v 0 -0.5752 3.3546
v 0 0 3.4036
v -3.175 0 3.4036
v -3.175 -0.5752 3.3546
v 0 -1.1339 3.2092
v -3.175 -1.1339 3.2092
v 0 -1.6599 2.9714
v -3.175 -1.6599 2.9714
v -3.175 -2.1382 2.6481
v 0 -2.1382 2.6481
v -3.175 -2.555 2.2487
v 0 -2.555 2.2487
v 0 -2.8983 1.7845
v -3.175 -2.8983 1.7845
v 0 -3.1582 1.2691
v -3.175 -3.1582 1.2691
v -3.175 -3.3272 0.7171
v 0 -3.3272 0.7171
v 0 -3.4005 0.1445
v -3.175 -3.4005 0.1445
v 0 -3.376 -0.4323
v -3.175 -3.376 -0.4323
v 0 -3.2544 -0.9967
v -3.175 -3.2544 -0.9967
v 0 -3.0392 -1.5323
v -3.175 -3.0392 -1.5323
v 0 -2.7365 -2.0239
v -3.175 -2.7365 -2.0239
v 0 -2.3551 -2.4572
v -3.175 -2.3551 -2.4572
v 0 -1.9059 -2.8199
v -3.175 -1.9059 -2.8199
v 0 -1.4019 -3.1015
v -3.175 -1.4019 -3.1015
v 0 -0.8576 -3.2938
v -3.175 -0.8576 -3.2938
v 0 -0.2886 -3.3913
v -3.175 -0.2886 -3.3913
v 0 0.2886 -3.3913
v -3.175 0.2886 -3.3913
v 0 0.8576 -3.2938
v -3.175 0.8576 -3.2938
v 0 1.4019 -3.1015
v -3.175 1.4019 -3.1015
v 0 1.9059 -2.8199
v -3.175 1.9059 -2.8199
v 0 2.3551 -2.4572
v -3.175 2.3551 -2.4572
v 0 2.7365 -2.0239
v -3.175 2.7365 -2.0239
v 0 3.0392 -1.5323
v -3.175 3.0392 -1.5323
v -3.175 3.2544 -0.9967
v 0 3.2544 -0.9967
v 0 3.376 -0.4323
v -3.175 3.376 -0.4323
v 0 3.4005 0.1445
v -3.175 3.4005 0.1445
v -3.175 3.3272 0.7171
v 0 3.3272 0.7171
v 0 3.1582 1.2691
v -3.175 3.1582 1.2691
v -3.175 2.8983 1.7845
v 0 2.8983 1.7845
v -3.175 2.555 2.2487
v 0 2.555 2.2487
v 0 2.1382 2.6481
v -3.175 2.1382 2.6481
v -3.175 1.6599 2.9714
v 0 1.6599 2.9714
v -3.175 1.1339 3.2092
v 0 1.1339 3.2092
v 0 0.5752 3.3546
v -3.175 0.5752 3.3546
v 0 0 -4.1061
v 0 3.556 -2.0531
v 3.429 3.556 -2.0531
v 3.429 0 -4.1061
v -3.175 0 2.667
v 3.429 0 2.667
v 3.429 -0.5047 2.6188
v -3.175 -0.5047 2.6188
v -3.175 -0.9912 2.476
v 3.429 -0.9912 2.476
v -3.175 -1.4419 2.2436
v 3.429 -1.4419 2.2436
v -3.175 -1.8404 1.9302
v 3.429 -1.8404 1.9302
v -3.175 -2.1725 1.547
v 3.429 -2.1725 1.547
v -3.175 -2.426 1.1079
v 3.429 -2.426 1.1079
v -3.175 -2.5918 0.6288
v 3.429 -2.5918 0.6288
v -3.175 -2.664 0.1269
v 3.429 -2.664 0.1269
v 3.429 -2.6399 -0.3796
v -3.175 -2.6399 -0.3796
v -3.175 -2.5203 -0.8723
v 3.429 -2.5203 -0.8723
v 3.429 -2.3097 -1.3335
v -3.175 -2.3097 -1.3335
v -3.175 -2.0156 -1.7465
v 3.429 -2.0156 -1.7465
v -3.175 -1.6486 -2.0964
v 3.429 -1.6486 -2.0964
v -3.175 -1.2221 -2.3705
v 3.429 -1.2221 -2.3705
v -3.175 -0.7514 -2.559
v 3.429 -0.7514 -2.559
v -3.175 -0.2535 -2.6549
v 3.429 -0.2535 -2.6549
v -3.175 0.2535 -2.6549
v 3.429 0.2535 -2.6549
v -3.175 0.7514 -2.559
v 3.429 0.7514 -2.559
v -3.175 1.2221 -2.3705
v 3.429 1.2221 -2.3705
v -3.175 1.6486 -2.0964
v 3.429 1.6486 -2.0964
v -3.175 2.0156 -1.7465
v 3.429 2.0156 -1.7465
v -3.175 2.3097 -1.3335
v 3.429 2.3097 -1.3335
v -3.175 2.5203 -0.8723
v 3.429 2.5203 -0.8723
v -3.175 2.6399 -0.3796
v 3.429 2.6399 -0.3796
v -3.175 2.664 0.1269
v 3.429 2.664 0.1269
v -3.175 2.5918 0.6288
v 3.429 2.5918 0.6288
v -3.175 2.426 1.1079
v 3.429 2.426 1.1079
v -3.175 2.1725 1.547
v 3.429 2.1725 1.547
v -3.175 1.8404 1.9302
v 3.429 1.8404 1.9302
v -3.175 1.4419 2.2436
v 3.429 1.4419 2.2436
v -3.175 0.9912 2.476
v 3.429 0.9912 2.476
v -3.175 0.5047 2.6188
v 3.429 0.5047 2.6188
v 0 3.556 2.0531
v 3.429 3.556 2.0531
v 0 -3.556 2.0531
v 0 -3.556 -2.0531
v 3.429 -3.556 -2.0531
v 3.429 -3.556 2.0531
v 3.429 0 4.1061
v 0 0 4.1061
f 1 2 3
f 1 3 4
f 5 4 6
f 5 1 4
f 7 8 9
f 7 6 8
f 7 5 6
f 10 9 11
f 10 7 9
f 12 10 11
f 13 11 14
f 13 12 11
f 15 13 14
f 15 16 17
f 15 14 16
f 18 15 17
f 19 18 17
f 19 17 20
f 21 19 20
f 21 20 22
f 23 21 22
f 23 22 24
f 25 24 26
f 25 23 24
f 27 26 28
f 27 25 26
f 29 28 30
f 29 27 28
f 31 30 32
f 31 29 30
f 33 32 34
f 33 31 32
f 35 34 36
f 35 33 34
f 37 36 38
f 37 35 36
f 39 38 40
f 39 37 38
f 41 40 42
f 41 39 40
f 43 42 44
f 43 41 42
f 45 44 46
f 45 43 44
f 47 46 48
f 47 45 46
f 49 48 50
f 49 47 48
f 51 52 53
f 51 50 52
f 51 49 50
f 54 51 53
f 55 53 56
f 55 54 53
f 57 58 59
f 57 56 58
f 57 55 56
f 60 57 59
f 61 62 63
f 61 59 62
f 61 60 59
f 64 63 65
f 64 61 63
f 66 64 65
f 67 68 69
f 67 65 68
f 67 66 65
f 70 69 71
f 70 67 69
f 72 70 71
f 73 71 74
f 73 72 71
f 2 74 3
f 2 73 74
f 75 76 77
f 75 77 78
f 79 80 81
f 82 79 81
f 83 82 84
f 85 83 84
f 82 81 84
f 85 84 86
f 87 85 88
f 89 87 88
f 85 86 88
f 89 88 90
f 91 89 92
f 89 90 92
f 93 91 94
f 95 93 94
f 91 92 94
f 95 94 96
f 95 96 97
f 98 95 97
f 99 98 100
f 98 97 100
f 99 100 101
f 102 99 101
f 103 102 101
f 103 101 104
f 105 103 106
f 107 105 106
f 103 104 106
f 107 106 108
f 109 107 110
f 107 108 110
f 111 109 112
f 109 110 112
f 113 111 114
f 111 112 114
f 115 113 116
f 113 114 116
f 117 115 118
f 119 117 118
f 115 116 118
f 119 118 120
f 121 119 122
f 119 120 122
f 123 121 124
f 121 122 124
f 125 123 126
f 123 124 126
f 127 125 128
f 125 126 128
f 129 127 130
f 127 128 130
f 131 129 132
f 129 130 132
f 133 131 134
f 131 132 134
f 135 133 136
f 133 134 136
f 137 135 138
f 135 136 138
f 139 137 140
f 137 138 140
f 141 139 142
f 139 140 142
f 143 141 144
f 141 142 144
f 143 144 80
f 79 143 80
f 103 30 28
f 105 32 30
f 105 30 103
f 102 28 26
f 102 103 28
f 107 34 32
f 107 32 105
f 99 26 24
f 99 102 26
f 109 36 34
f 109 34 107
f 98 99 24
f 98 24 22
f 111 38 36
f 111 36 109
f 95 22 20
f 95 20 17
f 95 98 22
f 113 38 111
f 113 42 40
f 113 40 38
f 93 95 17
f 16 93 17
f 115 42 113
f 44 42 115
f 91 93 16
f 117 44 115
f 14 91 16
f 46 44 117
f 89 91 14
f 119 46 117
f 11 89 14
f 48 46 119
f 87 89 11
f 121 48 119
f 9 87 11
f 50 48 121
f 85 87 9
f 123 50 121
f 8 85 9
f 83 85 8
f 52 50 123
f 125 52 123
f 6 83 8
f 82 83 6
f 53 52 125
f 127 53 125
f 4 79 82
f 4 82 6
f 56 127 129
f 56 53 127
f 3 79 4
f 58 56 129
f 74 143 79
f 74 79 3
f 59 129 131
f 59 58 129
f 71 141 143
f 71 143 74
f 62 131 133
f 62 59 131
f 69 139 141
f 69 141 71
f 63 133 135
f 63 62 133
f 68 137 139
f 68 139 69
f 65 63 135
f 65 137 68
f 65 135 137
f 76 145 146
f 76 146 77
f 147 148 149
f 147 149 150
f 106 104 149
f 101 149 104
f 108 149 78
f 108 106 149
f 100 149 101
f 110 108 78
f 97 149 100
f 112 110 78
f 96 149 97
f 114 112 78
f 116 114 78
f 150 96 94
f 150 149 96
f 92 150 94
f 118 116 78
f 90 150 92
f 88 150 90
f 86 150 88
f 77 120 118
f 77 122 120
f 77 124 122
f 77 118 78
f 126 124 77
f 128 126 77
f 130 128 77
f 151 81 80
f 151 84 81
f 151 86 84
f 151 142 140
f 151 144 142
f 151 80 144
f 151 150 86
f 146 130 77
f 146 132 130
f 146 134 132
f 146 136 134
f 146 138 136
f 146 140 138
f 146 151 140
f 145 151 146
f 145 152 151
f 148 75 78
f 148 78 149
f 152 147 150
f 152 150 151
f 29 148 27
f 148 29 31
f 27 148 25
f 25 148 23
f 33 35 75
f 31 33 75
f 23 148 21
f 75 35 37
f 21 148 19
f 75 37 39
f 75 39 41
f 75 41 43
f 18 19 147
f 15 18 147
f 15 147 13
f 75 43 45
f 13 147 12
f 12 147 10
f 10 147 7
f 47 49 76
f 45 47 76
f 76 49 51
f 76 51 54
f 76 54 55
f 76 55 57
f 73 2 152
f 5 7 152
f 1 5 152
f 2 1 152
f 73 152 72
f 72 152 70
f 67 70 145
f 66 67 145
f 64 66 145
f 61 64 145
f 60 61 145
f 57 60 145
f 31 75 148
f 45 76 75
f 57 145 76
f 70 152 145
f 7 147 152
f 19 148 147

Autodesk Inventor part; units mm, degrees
ref_plane "YZ Plane" through (0, 0, 0) normal (1, 0, 0) x (0, 1, 0)
ref_plane "XZ Plane" through (0, 0, 0) normal (0, 1, 0) x (-1, 0, 0)
ref_plane "XY Plane" through (0, 0, 0) normal (0, 0, 1) x (1, 0, 0)
sketch "Sketch1" plane through (0, 0, 0) normal (1, 0, 0) x (0, 1, 0)
  line L0 (3.556, -2.0531) -> (0, -4.1061)
  line L1 (0, -4.1061) -> (-3.556, -2.0531)
  line L2 (-3.556, -2.0531) -> (-3.556, 2.0531)
  line L3 (-3.556, 2.0531) -> (0, 4.1061)
  line L4 (0, 4.1061) -> (3.556, 2.0531)
  line L5 (3.556, 2.0531) -> (3.556, -2.0531)
  point P0 (0, 0)
  point P1 (0, 0)
  dimension "d0" = 7.112
extrude "Extrusion1" add sketch "Sketch1" along normal blind 3.429
sketch "Sketch2" plane through (0, 0, 0) normal (-1, 0, 0) x (0, 0, 1)
  circle A0 centre (0, 0) radius 3.4036
  dimension "d3" = 6.8072
extrude "Extrusion2" add sketch "Sketch2" along normal blind 3.175
sketch "Sketch3" plane through (-3.175, 0, 0) normal (-1, 0, 0) x (0, 0, 1)
  circle A0 centre (0, 0) radius 3.4036 projected
hole "Hole1" at (-3.175, 0, 0) direction (1, 0, 0) diameter 5.334 end through all
thread "Thread1" size "1/4-20 UNC" class "2B" standard "ANSI Unified Screw Threads" length 3.429 offset 3.175
properties part number "Hex Cap"
